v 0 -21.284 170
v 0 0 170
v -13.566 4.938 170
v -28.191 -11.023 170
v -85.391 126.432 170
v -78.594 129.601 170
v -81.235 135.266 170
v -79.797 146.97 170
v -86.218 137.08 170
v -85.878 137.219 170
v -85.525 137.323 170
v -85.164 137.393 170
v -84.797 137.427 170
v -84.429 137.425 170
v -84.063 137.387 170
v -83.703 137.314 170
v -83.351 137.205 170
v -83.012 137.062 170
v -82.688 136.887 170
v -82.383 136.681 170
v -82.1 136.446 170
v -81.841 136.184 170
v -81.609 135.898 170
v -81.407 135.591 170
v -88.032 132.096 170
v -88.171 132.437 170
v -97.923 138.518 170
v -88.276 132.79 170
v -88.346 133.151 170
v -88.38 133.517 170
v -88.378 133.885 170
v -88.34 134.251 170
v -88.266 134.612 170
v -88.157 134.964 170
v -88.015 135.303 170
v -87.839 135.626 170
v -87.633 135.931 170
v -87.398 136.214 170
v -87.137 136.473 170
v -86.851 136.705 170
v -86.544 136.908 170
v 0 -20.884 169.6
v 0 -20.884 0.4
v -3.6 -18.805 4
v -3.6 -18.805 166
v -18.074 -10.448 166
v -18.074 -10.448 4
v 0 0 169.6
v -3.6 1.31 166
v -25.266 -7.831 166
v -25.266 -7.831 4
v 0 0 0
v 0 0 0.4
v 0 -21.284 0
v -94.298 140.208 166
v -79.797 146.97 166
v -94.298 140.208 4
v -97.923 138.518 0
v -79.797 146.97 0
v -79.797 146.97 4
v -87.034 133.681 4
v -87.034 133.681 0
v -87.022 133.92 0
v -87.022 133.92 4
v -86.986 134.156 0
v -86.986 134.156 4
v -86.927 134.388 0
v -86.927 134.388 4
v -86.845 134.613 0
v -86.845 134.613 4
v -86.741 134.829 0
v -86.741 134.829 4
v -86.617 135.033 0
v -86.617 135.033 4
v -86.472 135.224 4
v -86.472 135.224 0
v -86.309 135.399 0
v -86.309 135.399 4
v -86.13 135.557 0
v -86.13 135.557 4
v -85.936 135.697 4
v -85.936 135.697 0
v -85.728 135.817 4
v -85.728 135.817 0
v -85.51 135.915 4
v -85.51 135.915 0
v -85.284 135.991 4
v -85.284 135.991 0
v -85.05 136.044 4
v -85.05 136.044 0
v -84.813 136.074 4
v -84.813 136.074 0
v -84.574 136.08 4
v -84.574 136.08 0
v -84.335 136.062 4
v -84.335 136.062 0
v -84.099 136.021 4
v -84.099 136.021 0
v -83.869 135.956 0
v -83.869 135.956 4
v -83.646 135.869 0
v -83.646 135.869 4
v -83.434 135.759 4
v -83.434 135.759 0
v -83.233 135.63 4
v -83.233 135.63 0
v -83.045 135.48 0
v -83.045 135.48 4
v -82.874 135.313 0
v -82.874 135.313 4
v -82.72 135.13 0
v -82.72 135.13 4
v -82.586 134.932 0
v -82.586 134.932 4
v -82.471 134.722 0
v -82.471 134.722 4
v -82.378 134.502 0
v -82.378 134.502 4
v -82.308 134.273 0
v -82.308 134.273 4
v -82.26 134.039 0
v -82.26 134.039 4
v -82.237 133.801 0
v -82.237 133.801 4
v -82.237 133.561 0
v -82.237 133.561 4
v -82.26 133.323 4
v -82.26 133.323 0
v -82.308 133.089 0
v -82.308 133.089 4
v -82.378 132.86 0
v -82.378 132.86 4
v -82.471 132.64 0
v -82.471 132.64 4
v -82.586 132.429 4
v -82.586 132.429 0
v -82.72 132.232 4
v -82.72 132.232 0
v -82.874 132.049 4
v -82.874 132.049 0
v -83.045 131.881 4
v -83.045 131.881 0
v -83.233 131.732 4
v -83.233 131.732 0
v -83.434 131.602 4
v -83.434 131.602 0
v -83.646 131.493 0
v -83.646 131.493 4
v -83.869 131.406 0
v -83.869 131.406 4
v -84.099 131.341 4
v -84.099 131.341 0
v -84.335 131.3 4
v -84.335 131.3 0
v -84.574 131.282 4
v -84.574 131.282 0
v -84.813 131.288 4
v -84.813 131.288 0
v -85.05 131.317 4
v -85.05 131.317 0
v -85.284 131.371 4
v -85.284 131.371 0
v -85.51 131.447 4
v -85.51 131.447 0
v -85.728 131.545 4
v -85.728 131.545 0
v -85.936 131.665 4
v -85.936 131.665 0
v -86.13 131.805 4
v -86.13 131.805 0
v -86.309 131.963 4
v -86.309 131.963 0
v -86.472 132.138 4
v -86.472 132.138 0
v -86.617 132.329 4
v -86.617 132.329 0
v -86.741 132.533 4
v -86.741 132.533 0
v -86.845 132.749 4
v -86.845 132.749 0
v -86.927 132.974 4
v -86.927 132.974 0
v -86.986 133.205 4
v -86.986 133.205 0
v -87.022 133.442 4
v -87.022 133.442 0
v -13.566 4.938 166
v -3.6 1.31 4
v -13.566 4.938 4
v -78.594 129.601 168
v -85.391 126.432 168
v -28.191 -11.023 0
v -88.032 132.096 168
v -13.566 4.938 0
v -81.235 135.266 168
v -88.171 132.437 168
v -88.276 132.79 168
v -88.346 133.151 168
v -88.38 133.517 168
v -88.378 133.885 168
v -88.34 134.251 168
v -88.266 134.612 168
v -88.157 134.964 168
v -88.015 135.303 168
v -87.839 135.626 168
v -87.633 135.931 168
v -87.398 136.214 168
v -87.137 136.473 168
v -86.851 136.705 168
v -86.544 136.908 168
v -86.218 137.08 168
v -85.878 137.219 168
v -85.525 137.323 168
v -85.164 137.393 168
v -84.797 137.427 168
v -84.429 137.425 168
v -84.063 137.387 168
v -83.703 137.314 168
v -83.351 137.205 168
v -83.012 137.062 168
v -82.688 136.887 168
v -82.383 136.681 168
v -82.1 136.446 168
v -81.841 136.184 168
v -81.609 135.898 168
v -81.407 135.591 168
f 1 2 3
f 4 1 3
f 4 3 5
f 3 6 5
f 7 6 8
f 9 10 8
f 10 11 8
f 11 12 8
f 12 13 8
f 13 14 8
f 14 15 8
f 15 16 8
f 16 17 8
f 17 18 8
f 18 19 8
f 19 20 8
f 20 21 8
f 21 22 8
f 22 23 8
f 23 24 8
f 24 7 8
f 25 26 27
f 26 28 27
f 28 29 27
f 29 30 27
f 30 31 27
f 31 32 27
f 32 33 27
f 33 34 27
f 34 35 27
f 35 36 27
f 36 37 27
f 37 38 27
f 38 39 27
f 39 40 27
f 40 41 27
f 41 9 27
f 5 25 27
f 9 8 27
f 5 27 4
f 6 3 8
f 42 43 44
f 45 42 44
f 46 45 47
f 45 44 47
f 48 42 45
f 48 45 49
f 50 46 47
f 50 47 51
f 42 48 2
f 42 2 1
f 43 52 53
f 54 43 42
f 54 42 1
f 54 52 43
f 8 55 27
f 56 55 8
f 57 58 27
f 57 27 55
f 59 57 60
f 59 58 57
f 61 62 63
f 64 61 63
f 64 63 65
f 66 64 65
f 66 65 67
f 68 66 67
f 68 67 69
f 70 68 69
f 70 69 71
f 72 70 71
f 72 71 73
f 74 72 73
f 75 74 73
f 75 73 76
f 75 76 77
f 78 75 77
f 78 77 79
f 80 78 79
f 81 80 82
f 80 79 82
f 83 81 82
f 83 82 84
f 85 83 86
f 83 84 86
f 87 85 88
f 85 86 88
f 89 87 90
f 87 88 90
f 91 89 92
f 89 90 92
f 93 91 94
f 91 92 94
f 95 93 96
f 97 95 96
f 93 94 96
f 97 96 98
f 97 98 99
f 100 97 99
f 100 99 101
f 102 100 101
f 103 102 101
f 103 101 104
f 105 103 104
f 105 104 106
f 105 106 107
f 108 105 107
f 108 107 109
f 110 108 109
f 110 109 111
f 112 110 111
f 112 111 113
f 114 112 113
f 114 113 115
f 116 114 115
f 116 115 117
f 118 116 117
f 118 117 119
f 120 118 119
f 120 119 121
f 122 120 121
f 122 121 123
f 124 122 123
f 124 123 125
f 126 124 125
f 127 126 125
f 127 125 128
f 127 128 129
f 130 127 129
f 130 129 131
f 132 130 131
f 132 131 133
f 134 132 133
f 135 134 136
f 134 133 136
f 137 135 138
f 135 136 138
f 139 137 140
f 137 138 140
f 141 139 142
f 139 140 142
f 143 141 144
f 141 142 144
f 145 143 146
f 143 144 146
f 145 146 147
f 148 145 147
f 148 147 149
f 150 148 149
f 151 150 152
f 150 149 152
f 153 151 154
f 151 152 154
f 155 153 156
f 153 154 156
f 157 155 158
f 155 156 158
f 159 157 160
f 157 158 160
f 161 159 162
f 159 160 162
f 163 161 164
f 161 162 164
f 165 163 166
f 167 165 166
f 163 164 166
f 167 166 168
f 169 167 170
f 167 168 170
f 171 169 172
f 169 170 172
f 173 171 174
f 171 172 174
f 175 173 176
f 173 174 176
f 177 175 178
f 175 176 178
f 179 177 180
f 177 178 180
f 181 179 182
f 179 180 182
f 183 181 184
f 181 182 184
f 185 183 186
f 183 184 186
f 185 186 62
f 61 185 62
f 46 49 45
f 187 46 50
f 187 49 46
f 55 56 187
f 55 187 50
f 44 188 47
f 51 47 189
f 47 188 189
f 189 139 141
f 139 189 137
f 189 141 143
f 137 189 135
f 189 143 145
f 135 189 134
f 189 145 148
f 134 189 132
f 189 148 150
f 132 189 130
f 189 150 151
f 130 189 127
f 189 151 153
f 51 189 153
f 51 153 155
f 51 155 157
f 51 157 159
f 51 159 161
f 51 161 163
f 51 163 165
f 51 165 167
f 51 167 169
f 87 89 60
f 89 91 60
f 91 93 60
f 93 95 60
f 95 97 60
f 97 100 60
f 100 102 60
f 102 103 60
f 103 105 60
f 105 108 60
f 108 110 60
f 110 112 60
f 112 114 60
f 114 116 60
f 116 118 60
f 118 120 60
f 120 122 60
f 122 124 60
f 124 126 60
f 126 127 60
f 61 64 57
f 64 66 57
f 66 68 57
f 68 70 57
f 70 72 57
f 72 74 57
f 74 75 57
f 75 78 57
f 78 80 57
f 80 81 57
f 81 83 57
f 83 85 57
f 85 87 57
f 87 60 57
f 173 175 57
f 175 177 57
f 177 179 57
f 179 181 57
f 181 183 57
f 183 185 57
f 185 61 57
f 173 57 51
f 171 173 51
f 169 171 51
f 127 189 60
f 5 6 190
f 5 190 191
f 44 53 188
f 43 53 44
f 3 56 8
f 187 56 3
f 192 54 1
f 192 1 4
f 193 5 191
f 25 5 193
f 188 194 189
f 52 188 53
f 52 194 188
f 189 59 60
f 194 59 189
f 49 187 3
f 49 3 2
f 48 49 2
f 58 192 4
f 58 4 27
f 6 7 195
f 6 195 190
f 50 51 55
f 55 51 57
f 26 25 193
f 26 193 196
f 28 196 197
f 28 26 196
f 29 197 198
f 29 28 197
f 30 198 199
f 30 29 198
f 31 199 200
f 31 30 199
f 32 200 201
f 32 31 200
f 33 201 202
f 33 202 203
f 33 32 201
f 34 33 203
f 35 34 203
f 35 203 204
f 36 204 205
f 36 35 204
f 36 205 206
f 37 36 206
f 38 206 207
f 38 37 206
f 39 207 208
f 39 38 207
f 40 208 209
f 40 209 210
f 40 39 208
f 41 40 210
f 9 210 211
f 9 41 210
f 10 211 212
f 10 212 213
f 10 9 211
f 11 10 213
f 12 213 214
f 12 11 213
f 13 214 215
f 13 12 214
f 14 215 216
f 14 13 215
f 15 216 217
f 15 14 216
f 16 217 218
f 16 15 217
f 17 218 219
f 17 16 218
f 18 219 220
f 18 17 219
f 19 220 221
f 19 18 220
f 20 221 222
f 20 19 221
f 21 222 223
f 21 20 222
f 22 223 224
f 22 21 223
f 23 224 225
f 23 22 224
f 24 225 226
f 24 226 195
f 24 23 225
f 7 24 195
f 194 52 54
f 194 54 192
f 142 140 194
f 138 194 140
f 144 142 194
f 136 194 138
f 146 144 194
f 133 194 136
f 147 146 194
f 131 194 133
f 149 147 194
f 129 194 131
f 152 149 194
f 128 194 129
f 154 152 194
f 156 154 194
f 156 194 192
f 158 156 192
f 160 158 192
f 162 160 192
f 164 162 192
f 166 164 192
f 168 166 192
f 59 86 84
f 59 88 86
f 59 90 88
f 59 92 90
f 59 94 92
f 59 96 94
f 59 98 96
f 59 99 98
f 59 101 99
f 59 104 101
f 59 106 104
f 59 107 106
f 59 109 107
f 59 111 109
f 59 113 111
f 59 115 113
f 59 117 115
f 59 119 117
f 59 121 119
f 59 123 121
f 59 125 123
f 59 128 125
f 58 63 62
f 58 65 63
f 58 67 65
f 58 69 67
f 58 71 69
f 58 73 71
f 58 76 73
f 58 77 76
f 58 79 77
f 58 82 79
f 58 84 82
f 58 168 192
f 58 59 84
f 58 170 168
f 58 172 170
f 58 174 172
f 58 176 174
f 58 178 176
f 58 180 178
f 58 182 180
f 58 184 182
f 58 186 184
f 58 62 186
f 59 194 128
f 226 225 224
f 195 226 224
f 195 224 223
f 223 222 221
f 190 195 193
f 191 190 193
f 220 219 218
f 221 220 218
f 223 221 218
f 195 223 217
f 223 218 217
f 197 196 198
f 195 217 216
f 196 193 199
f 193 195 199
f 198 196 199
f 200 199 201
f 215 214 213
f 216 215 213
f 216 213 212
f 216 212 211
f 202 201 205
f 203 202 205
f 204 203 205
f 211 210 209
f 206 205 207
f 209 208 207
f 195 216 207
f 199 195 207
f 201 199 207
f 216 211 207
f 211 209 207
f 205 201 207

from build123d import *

# Parameters (mm, degrees)
EXTRUDE_1_DEPTH     = 170
SHELL_7_T           = -4
CUT_EXTRUDE_2_DEPTH = 2
CUT_EXTRUDE_4_DEPTH = 162
CHAMFER_2_SIZE      = 3.6
SKETCH_7_R          = 2.4
CUT_EXTRUDE_5_DEPTH = 10


with BuildPart() as part:
    # 草图1 → 凸台-拉伸1 (new body)
    with BuildSketch(Plane.XY):
        Polygon((0, 0), (0, -21.28355545), (-28.190778624, -11.02295115), (-97.922791811, 138.517833711), (-79.79663607, 146.970198946), (-13.565707197, 4.937513627), align=None)
    extrude(amount=EXTRUDE_1_DEPTH)

    # 抽壳7
    shell_7_openings = [part.faces().sort_by_distance(p)[0] for p in [
        (0, -10.641777725, 85),
        (-6.782853599, 2.468756813, 85),
        (-46.681171634, 75.953856286, 85),
        (-88.85971394, 142.744016329, 85),
    ]]
    offset(amount=SHELL_7_T, openings=shell_7_openings, kind=Kind.INTERSECTION)

    # 草图4 → 切除-拉伸2 (cut)
    with BuildSketch(Plane.XY.offset(170)):
        with BuildLine():
            Line((-81.234877122, 135.26575694), (-78.593512986, 129.601333271))
            Line((-78.593512986, 129.601333271), (-85.390821389, 126.431696308))
            Line((-85.390821389, 126.431696308), (-88.032185524, 132.096119977))
            ThreePointArc((-88.032185524, 132.096119977), (-86.218349805, 137.07959266), (-81.234877122, 135.26575694))
        make_face()
    extrude(amount=-CUT_EXTRUDE_2_DEPTH, mode=Mode.SUBTRACT)

    # 草图2 → 切除-拉伸4 (cut)
    with BuildSketch(Plane.XY.offset(4)):
        Polygon((0, -20.88355545), (-19.529222148, -9.608353785), (0, -9.608353785), align=None)
    extrude(amount=CUT_EXTRUDE_4_DEPTH, mode=Mode.SUBTRACT)

    # 倒角2
    chamfer_2_edges = [part.edges().sort_by_distance(p)[0] for p in [
        (0, -10.441777725, 166),
        (0, -10.441777725, 4),
    ]]
    chamfer(chamfer_2_edges, length=CHAMFER_2_SIZE)

    # 草图7 → 切除-拉伸5 (cut)
    with BuildSketch(Plane(origin=(0, 0, 0), x_dir=(-1, 0, 0), z_dir=(0, 0, -1))):
        with Locations((84.633531323, 133.680938458)):
            Circle(SKETCH_7_R)
    extrude(amount=-CUT_EXTRUDE_5_DEPTH, mode=Mode.SUBTRACT)


solid = part.part
